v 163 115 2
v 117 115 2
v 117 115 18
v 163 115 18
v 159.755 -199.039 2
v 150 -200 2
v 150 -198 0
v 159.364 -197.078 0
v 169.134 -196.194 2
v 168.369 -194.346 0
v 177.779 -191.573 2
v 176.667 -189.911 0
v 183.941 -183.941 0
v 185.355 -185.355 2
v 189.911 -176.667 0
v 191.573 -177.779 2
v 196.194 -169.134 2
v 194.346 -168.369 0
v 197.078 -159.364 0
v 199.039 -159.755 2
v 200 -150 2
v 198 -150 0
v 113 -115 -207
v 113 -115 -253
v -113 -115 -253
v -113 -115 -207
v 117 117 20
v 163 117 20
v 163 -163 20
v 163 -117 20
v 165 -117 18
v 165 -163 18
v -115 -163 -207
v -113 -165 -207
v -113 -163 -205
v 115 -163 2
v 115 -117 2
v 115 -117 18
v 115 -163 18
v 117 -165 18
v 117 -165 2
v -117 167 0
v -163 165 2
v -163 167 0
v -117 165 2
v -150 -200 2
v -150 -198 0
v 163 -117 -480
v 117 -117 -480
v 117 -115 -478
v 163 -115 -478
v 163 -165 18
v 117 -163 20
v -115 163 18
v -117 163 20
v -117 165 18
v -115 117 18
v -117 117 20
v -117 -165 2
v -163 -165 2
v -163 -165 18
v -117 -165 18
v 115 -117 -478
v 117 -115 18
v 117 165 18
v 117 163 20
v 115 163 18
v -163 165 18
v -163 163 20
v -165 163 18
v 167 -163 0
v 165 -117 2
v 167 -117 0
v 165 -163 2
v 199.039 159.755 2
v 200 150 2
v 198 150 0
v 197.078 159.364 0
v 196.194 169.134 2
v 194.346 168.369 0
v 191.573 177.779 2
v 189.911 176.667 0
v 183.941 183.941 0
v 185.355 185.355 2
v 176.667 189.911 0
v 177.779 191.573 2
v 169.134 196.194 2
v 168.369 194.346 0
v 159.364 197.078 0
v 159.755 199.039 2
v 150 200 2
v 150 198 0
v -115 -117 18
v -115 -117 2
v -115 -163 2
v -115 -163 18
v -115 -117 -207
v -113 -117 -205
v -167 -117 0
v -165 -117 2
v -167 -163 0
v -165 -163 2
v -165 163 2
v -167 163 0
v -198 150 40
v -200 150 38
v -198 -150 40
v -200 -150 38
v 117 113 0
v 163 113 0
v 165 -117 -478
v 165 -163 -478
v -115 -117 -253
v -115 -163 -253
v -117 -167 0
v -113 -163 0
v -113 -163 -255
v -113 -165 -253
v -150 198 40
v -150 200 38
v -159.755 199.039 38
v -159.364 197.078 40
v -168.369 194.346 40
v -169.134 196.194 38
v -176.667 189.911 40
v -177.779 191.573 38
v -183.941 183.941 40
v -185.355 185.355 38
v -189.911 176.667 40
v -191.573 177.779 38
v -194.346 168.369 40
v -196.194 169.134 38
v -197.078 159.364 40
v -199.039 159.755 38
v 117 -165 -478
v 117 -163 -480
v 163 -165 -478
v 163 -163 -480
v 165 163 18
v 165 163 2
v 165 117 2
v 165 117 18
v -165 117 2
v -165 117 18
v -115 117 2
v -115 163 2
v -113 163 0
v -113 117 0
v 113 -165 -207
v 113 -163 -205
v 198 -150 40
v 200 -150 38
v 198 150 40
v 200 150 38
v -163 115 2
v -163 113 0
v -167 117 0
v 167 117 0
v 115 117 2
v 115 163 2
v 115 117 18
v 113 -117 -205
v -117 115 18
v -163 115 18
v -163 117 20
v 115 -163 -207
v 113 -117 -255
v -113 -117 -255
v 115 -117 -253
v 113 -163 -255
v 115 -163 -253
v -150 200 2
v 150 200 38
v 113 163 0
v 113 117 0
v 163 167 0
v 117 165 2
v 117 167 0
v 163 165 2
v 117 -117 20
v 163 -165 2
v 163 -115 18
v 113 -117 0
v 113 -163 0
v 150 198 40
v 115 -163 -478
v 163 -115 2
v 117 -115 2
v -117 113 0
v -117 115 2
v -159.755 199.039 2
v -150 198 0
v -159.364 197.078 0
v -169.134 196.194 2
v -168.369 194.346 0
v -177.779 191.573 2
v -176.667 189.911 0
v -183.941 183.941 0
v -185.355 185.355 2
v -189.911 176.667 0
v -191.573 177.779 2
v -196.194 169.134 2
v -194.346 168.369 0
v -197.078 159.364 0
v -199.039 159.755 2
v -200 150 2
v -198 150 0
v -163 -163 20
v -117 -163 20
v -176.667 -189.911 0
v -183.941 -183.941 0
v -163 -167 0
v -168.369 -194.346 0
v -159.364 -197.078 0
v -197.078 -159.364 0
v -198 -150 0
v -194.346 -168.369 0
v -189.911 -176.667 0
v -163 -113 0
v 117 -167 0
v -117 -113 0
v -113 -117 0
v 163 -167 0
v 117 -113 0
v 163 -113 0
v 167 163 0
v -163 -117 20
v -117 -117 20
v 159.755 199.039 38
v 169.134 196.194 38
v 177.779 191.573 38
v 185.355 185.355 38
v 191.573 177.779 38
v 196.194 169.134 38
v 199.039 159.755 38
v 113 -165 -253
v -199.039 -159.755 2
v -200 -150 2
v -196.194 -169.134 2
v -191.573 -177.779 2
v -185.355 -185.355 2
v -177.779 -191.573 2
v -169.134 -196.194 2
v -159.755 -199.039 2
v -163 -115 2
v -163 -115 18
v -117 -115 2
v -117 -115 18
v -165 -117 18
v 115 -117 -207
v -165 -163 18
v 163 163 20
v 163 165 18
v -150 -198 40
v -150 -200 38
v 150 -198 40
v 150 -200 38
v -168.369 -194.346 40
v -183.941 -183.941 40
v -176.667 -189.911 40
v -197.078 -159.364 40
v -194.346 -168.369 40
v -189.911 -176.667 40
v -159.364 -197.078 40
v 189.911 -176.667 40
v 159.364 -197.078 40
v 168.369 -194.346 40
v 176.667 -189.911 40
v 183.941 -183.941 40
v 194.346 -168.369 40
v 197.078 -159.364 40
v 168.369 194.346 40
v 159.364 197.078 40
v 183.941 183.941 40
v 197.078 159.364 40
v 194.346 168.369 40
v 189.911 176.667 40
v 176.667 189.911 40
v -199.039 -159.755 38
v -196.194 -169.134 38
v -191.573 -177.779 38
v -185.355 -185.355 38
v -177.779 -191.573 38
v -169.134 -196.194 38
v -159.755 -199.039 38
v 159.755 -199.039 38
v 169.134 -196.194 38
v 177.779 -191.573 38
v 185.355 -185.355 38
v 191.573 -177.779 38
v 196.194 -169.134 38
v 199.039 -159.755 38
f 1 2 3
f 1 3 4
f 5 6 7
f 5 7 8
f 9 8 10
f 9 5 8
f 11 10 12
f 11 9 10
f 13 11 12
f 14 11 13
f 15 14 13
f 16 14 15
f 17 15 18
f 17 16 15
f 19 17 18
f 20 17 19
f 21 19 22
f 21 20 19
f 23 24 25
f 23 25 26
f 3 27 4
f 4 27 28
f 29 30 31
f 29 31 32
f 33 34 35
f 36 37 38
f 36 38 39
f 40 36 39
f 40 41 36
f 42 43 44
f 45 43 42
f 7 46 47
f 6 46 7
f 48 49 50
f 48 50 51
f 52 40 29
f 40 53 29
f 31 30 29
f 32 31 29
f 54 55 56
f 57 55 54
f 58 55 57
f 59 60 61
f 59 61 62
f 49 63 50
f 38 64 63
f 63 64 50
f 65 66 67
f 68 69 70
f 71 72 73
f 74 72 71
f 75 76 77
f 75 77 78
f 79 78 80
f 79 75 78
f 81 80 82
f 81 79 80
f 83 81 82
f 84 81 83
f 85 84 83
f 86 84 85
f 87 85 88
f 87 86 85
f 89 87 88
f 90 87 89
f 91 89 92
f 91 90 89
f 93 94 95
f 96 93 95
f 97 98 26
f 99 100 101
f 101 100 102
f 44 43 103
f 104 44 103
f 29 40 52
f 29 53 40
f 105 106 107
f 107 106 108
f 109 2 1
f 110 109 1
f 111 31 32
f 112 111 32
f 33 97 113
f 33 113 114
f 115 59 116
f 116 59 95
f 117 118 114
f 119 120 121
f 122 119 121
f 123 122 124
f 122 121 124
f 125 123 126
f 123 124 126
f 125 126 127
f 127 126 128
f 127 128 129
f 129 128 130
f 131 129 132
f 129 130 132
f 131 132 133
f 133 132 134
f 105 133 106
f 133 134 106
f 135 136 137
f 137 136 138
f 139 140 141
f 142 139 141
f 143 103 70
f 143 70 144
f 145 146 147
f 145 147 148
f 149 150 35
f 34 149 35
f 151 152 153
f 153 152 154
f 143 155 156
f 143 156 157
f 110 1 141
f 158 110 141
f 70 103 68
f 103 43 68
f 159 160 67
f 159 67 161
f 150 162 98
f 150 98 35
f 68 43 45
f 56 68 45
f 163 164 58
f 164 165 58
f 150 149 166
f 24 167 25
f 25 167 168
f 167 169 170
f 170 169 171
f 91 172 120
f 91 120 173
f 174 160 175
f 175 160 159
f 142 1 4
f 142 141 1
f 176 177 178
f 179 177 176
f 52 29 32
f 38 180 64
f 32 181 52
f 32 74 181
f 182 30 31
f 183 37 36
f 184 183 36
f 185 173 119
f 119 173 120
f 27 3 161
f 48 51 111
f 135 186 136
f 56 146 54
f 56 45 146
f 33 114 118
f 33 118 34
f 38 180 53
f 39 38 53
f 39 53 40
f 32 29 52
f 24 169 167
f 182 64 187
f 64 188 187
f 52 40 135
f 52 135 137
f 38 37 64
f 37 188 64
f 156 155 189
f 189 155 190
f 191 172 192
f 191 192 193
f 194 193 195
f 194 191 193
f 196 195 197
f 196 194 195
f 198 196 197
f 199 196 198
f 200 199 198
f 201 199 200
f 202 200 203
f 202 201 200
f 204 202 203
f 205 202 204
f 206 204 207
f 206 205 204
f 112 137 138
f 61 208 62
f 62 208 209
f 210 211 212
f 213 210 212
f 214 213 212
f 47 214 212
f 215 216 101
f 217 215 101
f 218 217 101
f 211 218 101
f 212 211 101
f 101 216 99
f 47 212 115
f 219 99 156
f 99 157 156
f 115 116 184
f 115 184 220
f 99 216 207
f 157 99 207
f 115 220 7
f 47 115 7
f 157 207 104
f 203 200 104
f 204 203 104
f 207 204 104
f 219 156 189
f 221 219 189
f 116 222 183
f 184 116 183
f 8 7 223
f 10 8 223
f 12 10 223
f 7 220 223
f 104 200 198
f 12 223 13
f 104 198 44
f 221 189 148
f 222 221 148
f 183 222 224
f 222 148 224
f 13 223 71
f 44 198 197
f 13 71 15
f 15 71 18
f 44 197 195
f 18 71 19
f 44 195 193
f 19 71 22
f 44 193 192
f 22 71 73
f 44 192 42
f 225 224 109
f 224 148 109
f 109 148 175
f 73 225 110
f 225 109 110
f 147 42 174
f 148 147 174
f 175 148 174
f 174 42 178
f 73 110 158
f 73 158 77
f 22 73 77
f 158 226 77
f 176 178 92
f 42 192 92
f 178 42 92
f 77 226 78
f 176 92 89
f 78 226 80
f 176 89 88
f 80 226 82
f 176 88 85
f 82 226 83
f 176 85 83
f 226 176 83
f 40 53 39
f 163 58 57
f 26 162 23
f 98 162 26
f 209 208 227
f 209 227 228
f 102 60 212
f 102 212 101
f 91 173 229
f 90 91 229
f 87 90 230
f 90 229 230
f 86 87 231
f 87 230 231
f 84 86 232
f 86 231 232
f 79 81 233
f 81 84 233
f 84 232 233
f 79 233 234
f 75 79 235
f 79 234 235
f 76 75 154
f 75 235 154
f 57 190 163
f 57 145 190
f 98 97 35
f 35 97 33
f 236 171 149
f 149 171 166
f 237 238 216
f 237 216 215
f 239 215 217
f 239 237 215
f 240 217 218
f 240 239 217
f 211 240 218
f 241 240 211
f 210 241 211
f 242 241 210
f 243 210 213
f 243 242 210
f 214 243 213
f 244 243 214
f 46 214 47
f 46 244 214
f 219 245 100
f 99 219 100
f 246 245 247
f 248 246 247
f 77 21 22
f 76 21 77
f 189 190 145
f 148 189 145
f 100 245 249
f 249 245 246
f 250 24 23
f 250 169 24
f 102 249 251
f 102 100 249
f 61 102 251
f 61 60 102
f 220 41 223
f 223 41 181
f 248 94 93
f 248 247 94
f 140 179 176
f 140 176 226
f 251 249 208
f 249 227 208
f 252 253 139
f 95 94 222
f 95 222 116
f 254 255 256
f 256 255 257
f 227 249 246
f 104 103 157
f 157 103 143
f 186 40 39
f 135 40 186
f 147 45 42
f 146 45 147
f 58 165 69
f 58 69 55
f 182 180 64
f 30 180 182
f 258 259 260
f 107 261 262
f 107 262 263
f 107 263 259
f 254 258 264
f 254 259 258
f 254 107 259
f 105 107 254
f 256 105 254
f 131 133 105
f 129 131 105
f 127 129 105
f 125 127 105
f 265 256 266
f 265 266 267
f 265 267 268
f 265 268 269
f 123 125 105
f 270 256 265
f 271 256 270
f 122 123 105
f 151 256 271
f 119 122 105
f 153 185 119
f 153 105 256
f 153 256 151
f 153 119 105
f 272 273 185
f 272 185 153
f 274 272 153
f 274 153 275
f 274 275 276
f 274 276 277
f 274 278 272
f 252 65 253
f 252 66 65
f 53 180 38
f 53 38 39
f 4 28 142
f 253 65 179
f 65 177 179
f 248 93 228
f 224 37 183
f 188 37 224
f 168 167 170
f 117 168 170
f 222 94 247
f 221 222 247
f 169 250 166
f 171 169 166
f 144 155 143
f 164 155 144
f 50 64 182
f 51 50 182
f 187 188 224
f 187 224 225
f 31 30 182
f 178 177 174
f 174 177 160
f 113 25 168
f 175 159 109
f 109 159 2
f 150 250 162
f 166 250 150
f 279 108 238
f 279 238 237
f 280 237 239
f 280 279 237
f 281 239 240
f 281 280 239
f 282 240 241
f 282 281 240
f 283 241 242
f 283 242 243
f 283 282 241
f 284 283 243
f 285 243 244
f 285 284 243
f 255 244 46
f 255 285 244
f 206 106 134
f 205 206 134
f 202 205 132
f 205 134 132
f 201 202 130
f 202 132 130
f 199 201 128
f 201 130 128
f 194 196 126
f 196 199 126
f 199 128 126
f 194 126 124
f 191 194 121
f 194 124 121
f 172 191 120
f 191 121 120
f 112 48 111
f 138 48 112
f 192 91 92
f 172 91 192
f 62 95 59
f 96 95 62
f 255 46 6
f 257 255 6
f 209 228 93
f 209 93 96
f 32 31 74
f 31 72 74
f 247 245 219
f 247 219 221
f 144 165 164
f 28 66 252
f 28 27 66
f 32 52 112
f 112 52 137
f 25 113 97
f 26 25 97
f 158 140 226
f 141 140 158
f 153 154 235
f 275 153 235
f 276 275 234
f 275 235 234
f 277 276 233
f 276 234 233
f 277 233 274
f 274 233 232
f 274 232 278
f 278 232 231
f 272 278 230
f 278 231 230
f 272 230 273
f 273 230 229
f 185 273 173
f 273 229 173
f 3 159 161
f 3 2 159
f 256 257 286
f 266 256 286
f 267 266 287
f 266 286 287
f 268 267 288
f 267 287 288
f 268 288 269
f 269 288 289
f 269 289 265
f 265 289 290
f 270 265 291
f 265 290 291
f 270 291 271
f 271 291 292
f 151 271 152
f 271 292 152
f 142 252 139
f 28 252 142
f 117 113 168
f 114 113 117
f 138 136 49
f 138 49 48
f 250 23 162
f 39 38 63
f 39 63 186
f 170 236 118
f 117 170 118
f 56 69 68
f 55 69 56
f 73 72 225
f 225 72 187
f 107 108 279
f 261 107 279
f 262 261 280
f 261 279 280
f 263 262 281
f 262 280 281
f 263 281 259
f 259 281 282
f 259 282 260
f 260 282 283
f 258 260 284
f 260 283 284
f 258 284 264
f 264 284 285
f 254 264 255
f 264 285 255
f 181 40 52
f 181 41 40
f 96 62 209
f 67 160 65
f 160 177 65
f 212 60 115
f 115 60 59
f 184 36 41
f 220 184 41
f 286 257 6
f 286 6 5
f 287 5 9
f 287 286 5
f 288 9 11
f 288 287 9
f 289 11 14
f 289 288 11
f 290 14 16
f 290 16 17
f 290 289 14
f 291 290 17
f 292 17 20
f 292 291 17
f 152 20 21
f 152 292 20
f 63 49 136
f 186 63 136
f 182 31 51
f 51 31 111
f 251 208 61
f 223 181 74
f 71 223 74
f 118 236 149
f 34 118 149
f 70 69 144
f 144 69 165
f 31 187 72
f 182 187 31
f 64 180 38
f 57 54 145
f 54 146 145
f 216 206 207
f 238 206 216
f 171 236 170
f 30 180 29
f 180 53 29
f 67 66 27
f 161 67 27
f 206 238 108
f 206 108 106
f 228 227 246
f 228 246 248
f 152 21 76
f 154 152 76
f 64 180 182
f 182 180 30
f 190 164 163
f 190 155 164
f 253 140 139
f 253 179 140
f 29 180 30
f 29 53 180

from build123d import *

# Parameters (mm, degrees)
F0_W      = 400
F0_H      = 400
F1_DEPTH  = 40
F2_W      = 50
F2_H      = 50
F3_DEPTH  = 20
F4_R      = 50
F5_DEPTH  = 500
F6_W      = 50
F6_H      = 50
F7_DEPTH  = 230
F8_SIZE   = 2
F8_2_SIZE = 2
F8_3_SIZE = 2


with BuildPart() as f1:
    # F0 (on Top) → F1 (new body)
    with BuildSketch(Plane.XY):
        Rectangle(F0_W, F0_H)
    extrude(amount=F1_DEPTH)

    # F2 (on face) → F3 (cut)
    with BuildSketch(Plane(origin=(0, 0, 0), x_dir=(1, 0, 0), z_dir=(0, 0, -1))):
        with Locations((140, 140)):
            Rectangle(F2_W, F2_H)
        with Locations((140, -140)):
            Rectangle(F2_W, F2_H)
        with Locations((-140, -140)):
            Rectangle(F2_W, F2_H)
        with Locations((-140, 140)):
            Rectangle(F2_W, F2_H)
    extrude(amount=-F3_DEPTH, mode=Mode.SUBTRACT)

    # F4
    f4_edges = [f1.edges().sort_by_distance(p)[0] for p in [
        (200, -200, 20),
        (200, 200, 20),
        (-200, 200, 20),
        (-200, -200, 20),
    ]]
    fillet(f4_edges, radius=F4_R)


with BuildPart() as f5:
    # F5 (new): a face of the model
    f5_faces = [f1.part.faces().sort_by_distance(p)[0] for p in [
        (140, -140, 20),
    ]]
    extrude(f5_faces, amount=F5_DEPTH)

    # F8#2
    f8_2_edges = [f5.edges().sort_by_distance(p)[0] for p in [
        (140, -115, 20),
        (165, -140, 20),
        (140, -165, 20),
        (115, -140, 20),
        (115, -165, -230),
        (115, -115, -230),
        (115, -140, -480),
        (165, -165, -230),
        (140, -165, -480),
        (140, -115, -480),
        (165, -115, -230),
        (165, -140, -480),
    ]]
    chamfer(f8_2_edges, length=F8_2_SIZE)


with BuildPart() as f7:
    # F6 (on face) → F7 (new body, through all)
    with BuildSketch(Plane(origin=(115, 0, 0), x_dir=(0, -1, 0), z_dir=(-1, 0, 0))):
        with Locations((140, -230)):
            Rectangle(F6_W, F6_H)
    extrude(amount=F7_DEPTH)

    # F8#3
    f8_3_edges = [f7.edges().sort_by_distance(p)[0] for p in [
        (115, -165, -230),
        (115, -115, -230),
        (0, -165, -205),
        (0, -115, -205),
        (115, -140, -205),
        (0, -165, -255),
        (115, -140, -255),
        (0, -115, -255),
        (-115, -165, -230),
        (-115, -140, -205),
        (-115, -115, -230),
        (-115, -140, -255),
    ]]
    chamfer(f8_3_edges, length=F8_3_SIZE)


with BuildPart() as f1_1:
    add(f1.part)

    # F8
    f8_edges = [f1_1.edges().sort_by_distance(p)[0] for p in [
        (-185.355339, -185.355339, 0),
        (185.355339, -185.355339, 40),
        (-185.355339, 185.355339, 40),
        (-185.355339, 185.355339, 0),
        (0, -200, 0),
        (0, -200, 40),
        (-200, 0, 0),
        (0, 200, 40),
        (-185.355339, -185.355339, 40),
        (-200, 0, 40),
        (200, 0, 40),
        (185.355339, 185.355339, 40),
        (150, -200, 20),
        (150, 200, 20),
        (185.355339, 185.355339, 0),
        (-200, -150, 20),
        (-140, -165, 0),
        (200, 150, 20),
        (140, 165, 20),
        (200, -150, 20),
        (-200, 150, 20),
        (200, 0, 0),
        (115, -140, 0),
        (0, 200, 0),
        (-150, 200, 20),
        (-140, 115, 20),
        (140, -115, 20),
        (-150, -200, 20),
        (185.355339, -185.355339, 0),
        (140, 115, 0),
        (-115, -140, 0),
        (140, 165, 0),
        (165, -140, 20),
        (-115, 140, 20),
        (165, 140, 0),
        (-140, 165, 0),
        (165, 165, 10),
        (140, -165, 20),
        (-165, -140, 20),
        (-165, -140, 0),
        (-165, 140, 0),
        (-140, 165, 20),
        (-165, 140, 20),
        (140, 115, 20),
        (-115, 140, 0),
        (-140, -165, 20),
        (-165, -165, 10),
        (115, -140, 20),
        (115, 115, 10),
        (-165, 115, 10),
        (-165, -115, 10),
        (165, 140, 20),
        (-115, -165, 10),
        (140, -165, 0),
        (-165, 165, 10),
        (-140, -115, 0),
        (115, 140, 20),
        (165, -140, 0),
        (-115, -115, 10),
        (115, 140, 0),
        (-115, 115, 10),
        (-140, 115, 0),
        (115, 165, 10),
        (-115, -140, 20),
        (-140, -115, 20),
        (140, -115, 0),
        (165, 115, 10),
        (-115, 165, 10),
        (165, -165, 10),
        (165, -115, 10),
        (115, -115, 10),
        (115, -165, 10),
    ]]
    chamfer(f8_edges, length=F8_SIZE)


solid = Compound([f5.part, f7.part, f1_1.part])
